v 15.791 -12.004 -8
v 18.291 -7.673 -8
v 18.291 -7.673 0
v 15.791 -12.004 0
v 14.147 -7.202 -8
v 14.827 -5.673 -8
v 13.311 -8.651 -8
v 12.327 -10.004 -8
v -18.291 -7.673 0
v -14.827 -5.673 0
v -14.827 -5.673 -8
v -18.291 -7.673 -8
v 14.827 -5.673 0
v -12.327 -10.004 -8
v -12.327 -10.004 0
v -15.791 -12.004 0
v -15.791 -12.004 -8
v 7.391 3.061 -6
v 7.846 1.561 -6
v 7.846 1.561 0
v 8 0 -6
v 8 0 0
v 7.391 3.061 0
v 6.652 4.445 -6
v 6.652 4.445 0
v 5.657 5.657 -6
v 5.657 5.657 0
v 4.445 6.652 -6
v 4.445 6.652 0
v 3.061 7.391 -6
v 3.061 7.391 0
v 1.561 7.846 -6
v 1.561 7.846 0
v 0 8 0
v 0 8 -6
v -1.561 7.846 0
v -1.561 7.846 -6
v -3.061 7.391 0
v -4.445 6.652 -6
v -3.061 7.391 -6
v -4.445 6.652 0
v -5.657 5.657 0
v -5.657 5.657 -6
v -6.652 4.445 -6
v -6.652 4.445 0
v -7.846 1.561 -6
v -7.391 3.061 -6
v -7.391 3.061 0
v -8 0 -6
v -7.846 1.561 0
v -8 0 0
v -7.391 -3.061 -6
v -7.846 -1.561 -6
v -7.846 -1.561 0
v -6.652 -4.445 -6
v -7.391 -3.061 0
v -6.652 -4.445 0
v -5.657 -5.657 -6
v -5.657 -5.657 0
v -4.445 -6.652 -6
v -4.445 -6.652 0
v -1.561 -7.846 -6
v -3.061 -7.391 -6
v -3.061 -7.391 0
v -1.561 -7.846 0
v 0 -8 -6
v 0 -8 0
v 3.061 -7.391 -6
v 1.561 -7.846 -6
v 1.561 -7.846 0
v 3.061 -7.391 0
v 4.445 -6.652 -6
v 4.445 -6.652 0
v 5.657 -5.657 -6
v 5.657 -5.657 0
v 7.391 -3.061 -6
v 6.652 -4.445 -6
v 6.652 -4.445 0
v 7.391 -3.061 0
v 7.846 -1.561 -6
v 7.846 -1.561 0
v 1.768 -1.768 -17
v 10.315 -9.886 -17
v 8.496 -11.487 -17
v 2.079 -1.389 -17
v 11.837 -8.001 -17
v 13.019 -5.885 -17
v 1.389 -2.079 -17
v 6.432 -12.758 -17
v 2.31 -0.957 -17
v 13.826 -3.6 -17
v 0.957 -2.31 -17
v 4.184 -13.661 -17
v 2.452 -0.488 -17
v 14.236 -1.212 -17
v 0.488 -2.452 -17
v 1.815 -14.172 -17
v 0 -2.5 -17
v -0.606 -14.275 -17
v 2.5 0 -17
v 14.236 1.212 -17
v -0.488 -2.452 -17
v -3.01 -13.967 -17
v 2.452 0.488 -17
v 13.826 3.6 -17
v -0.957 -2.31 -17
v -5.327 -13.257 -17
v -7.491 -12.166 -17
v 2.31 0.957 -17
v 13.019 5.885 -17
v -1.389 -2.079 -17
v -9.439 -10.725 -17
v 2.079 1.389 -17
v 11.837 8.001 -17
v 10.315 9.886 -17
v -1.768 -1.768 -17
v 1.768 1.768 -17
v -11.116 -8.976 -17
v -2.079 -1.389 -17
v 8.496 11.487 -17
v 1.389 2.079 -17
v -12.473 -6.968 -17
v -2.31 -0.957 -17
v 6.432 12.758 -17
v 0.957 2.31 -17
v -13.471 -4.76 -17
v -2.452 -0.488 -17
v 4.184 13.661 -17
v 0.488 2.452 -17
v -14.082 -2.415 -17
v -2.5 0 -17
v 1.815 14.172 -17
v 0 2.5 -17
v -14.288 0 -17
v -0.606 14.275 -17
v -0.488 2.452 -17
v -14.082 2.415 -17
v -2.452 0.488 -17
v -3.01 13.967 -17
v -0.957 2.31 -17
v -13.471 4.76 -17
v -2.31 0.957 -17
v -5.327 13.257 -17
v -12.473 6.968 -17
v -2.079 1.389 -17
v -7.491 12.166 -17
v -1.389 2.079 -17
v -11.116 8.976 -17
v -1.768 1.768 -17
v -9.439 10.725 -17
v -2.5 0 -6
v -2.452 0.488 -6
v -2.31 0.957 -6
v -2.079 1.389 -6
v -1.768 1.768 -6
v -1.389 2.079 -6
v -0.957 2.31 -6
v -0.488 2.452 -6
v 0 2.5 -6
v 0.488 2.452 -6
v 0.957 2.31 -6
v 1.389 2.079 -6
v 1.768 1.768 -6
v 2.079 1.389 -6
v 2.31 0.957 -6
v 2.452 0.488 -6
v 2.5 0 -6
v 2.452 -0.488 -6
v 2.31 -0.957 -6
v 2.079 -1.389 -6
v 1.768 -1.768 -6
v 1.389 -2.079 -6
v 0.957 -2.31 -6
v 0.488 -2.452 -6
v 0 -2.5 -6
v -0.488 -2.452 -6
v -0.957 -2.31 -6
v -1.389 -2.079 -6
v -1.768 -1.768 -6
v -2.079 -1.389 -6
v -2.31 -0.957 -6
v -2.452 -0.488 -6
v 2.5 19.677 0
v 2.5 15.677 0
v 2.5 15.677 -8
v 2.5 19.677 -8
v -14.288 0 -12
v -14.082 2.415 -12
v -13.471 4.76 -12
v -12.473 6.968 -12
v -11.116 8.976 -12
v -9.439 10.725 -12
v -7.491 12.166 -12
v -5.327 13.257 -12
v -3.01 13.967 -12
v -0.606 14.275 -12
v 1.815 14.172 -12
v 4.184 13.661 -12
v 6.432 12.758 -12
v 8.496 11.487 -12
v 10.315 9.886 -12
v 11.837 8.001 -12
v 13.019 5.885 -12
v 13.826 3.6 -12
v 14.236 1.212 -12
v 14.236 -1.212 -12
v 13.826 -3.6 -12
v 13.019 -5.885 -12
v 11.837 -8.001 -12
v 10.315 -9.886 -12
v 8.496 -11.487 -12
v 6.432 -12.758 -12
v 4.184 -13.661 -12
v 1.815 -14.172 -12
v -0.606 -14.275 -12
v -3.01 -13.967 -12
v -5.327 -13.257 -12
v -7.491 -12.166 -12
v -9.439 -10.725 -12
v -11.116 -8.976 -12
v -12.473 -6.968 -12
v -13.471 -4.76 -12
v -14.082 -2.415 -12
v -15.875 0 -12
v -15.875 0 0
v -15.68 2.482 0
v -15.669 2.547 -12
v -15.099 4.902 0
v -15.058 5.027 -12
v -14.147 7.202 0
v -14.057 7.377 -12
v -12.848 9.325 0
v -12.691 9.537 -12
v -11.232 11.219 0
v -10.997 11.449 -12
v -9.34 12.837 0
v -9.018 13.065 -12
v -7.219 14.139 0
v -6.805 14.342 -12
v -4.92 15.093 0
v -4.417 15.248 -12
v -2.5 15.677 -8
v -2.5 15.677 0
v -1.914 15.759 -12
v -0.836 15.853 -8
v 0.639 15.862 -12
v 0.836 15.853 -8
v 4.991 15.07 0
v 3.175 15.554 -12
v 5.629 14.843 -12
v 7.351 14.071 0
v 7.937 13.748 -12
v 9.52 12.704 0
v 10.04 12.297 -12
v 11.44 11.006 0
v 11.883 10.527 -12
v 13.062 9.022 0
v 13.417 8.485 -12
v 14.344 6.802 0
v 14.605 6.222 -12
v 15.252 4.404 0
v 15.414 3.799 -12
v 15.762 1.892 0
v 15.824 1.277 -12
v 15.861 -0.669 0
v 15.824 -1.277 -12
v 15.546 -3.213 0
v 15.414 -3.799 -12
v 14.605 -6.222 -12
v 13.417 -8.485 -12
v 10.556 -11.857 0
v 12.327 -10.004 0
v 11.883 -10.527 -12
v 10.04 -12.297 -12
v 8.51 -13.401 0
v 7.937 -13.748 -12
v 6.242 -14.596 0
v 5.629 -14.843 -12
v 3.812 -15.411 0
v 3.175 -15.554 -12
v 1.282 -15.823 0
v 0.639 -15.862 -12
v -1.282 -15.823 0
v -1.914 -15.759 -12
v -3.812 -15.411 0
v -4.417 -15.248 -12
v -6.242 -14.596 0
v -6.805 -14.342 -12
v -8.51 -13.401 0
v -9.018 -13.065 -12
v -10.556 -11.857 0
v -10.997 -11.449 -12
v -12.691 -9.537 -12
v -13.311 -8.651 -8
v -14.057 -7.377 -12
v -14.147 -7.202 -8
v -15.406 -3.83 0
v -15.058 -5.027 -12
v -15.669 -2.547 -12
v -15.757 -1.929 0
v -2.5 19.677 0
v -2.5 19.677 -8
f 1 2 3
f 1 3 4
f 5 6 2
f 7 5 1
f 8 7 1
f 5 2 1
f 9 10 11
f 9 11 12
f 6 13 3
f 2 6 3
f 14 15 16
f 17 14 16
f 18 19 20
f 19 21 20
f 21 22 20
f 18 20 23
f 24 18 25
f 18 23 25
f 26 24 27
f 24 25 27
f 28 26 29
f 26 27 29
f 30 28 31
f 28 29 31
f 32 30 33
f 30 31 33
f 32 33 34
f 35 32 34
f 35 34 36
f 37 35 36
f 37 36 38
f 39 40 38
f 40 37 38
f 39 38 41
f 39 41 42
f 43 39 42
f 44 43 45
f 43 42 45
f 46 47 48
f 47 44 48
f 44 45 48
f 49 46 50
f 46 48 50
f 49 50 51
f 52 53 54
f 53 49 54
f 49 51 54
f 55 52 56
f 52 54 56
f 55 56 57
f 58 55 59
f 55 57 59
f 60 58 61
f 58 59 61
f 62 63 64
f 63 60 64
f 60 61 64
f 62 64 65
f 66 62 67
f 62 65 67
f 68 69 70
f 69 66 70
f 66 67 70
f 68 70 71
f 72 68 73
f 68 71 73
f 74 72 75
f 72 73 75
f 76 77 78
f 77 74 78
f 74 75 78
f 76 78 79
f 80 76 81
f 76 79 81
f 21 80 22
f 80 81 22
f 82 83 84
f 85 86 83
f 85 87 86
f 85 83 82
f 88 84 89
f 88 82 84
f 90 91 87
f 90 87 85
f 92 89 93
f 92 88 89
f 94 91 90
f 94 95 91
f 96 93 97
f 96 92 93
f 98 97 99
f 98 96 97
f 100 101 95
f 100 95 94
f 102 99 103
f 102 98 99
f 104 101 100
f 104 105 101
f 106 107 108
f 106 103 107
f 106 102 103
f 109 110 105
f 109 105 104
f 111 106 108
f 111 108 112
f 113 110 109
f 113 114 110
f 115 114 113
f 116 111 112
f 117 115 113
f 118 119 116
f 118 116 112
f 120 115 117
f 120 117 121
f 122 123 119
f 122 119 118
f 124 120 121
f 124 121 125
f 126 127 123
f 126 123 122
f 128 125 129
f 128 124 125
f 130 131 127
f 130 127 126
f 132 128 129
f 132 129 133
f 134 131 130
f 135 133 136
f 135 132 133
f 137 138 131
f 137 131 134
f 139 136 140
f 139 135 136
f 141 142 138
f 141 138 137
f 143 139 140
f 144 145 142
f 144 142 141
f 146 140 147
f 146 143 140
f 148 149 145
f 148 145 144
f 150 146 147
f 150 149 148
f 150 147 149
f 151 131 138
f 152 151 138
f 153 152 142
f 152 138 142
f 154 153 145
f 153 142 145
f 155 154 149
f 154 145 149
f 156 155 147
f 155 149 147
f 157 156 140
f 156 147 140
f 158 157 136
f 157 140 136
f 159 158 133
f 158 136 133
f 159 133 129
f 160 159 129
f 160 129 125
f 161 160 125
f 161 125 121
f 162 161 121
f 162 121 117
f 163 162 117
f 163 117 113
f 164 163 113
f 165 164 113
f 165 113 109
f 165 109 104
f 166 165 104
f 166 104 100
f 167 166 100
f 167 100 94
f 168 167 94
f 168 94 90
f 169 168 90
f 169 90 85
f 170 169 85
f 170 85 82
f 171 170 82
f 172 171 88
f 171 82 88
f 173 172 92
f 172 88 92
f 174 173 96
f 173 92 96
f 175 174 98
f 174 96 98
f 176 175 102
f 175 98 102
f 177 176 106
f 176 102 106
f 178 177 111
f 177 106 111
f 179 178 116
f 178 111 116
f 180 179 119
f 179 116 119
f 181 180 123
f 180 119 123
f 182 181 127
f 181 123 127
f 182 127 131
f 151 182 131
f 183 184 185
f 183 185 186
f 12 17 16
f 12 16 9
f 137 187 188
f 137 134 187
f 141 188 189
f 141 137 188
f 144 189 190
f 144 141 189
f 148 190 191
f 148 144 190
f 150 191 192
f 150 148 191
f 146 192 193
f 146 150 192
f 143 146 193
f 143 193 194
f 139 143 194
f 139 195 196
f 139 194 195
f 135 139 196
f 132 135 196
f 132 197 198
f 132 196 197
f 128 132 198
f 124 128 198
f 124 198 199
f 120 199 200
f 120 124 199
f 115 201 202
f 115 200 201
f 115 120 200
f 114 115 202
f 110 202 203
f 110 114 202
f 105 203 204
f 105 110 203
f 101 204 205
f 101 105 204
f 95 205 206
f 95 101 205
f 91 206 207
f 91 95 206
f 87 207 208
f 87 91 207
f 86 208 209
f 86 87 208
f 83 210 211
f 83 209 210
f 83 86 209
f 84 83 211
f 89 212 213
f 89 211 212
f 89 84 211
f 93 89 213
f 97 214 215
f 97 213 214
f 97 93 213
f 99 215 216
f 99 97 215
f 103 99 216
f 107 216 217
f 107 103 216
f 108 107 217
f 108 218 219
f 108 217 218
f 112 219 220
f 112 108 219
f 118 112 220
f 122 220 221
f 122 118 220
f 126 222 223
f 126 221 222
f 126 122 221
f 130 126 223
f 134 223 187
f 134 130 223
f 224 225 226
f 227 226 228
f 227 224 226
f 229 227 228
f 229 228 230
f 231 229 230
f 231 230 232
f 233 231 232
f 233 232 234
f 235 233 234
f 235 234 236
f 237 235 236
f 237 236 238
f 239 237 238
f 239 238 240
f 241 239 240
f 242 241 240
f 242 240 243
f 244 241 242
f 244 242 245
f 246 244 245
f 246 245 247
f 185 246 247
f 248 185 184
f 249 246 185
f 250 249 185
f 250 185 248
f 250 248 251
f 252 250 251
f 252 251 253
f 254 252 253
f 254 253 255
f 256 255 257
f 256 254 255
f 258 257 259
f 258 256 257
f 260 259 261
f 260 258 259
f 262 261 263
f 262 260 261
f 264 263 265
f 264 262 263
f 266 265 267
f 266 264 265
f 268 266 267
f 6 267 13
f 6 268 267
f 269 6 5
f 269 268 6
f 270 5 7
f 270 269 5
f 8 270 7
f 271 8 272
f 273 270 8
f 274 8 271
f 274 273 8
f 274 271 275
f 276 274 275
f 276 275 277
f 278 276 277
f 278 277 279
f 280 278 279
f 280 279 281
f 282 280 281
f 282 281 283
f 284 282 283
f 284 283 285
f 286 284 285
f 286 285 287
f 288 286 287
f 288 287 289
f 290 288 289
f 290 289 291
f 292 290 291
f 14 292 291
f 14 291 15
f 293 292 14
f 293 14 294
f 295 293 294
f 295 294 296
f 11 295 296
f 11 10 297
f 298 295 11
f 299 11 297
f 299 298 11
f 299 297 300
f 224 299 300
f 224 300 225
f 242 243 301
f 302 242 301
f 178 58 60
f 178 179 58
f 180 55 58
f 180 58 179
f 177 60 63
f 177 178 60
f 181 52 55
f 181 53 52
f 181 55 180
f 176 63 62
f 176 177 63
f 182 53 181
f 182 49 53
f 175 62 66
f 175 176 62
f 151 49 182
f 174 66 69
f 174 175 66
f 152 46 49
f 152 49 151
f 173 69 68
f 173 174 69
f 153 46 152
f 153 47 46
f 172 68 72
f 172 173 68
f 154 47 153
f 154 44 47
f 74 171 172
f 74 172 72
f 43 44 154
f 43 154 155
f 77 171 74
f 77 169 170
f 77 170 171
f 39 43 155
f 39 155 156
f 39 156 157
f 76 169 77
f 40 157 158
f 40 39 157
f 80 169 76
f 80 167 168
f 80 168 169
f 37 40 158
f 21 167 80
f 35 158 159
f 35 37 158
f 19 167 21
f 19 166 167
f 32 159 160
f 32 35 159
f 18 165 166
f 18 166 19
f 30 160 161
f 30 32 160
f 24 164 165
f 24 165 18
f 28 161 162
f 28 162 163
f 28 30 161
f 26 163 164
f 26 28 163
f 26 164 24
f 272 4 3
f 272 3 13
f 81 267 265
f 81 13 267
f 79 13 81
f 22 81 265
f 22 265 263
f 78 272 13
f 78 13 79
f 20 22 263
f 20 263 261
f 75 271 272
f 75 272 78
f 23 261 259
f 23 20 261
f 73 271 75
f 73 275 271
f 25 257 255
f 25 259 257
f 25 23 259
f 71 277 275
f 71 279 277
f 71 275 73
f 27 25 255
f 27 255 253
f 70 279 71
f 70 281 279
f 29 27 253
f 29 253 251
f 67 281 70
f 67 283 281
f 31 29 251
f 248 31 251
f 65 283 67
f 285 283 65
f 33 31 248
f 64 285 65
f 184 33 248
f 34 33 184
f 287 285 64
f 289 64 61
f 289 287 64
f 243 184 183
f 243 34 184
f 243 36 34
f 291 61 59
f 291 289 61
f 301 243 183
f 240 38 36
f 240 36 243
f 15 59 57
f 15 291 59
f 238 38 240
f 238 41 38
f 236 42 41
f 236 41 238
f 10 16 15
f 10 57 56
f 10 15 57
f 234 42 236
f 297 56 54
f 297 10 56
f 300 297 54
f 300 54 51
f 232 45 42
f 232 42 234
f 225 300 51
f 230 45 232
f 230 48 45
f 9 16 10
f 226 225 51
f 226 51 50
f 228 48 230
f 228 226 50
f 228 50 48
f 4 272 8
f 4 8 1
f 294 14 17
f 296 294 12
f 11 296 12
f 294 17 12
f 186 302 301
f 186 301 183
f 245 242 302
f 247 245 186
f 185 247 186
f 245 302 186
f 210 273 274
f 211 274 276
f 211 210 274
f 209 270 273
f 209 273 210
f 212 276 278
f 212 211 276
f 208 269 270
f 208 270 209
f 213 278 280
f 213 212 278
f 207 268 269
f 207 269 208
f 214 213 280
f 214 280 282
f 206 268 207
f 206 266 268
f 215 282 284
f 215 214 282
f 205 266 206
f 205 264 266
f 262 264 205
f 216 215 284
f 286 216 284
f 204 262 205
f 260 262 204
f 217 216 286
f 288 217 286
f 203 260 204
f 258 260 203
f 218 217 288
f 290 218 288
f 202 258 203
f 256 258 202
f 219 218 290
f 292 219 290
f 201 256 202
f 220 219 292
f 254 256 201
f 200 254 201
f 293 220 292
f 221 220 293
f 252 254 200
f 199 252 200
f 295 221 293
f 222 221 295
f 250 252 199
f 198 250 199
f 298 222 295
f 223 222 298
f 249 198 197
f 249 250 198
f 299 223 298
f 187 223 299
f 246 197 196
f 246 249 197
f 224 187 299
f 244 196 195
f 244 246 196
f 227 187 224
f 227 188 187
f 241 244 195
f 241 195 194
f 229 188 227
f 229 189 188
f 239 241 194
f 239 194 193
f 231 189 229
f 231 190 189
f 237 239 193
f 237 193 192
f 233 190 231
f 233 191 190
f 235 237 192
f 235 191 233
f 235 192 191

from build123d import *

# Parameters (mm, degrees)
F3_D           = 5
F3_CBORE_D     = 16
F3_CBORE_DEPTH = 6
F4_W           = 5
F4_H           = 4
F5_DEPTH       = 8
F6_COUNT       = 3


with BuildPart() as f1:
    # F0 (on Front) → F1 (revolve)
    with BuildSketch(Plane.XZ):
        Polygon((0, -17), (0, 0), (-15.875, 0), (-15.875, -12), (-14.2875, -12), (-14.2875, -17), align=None)
    revolve(axis=Axis((0, 0, -23.116006), (0, 0, -1)))

    # F3 (through all)
    with Locations(Plane.XY):
        with Locations((0, 0)):
            CounterBoreHole(F3_D / 2, F3_CBORE_D / 2, F3_CBORE_DEPTH)

    # F4 (on face) → F5 (join)
    with BuildSketch(Plane.XY):
        with Locations((0, 17.676914)):
            Rectangle(F4_W, F4_H)
    extrude(amount=-F5_DEPTH)

    # F6: F1 ×3 about axis
    f6_axis = Axis((0, 0, -12), (0, 0, -1))


with BuildPart() as f1_1:
    add(f1.part)
    for i in range(1, F6_COUNT):
        add(f1.part.rotate(f6_axis, i * 360 / F6_COUNT))


solid = f1_1.part
